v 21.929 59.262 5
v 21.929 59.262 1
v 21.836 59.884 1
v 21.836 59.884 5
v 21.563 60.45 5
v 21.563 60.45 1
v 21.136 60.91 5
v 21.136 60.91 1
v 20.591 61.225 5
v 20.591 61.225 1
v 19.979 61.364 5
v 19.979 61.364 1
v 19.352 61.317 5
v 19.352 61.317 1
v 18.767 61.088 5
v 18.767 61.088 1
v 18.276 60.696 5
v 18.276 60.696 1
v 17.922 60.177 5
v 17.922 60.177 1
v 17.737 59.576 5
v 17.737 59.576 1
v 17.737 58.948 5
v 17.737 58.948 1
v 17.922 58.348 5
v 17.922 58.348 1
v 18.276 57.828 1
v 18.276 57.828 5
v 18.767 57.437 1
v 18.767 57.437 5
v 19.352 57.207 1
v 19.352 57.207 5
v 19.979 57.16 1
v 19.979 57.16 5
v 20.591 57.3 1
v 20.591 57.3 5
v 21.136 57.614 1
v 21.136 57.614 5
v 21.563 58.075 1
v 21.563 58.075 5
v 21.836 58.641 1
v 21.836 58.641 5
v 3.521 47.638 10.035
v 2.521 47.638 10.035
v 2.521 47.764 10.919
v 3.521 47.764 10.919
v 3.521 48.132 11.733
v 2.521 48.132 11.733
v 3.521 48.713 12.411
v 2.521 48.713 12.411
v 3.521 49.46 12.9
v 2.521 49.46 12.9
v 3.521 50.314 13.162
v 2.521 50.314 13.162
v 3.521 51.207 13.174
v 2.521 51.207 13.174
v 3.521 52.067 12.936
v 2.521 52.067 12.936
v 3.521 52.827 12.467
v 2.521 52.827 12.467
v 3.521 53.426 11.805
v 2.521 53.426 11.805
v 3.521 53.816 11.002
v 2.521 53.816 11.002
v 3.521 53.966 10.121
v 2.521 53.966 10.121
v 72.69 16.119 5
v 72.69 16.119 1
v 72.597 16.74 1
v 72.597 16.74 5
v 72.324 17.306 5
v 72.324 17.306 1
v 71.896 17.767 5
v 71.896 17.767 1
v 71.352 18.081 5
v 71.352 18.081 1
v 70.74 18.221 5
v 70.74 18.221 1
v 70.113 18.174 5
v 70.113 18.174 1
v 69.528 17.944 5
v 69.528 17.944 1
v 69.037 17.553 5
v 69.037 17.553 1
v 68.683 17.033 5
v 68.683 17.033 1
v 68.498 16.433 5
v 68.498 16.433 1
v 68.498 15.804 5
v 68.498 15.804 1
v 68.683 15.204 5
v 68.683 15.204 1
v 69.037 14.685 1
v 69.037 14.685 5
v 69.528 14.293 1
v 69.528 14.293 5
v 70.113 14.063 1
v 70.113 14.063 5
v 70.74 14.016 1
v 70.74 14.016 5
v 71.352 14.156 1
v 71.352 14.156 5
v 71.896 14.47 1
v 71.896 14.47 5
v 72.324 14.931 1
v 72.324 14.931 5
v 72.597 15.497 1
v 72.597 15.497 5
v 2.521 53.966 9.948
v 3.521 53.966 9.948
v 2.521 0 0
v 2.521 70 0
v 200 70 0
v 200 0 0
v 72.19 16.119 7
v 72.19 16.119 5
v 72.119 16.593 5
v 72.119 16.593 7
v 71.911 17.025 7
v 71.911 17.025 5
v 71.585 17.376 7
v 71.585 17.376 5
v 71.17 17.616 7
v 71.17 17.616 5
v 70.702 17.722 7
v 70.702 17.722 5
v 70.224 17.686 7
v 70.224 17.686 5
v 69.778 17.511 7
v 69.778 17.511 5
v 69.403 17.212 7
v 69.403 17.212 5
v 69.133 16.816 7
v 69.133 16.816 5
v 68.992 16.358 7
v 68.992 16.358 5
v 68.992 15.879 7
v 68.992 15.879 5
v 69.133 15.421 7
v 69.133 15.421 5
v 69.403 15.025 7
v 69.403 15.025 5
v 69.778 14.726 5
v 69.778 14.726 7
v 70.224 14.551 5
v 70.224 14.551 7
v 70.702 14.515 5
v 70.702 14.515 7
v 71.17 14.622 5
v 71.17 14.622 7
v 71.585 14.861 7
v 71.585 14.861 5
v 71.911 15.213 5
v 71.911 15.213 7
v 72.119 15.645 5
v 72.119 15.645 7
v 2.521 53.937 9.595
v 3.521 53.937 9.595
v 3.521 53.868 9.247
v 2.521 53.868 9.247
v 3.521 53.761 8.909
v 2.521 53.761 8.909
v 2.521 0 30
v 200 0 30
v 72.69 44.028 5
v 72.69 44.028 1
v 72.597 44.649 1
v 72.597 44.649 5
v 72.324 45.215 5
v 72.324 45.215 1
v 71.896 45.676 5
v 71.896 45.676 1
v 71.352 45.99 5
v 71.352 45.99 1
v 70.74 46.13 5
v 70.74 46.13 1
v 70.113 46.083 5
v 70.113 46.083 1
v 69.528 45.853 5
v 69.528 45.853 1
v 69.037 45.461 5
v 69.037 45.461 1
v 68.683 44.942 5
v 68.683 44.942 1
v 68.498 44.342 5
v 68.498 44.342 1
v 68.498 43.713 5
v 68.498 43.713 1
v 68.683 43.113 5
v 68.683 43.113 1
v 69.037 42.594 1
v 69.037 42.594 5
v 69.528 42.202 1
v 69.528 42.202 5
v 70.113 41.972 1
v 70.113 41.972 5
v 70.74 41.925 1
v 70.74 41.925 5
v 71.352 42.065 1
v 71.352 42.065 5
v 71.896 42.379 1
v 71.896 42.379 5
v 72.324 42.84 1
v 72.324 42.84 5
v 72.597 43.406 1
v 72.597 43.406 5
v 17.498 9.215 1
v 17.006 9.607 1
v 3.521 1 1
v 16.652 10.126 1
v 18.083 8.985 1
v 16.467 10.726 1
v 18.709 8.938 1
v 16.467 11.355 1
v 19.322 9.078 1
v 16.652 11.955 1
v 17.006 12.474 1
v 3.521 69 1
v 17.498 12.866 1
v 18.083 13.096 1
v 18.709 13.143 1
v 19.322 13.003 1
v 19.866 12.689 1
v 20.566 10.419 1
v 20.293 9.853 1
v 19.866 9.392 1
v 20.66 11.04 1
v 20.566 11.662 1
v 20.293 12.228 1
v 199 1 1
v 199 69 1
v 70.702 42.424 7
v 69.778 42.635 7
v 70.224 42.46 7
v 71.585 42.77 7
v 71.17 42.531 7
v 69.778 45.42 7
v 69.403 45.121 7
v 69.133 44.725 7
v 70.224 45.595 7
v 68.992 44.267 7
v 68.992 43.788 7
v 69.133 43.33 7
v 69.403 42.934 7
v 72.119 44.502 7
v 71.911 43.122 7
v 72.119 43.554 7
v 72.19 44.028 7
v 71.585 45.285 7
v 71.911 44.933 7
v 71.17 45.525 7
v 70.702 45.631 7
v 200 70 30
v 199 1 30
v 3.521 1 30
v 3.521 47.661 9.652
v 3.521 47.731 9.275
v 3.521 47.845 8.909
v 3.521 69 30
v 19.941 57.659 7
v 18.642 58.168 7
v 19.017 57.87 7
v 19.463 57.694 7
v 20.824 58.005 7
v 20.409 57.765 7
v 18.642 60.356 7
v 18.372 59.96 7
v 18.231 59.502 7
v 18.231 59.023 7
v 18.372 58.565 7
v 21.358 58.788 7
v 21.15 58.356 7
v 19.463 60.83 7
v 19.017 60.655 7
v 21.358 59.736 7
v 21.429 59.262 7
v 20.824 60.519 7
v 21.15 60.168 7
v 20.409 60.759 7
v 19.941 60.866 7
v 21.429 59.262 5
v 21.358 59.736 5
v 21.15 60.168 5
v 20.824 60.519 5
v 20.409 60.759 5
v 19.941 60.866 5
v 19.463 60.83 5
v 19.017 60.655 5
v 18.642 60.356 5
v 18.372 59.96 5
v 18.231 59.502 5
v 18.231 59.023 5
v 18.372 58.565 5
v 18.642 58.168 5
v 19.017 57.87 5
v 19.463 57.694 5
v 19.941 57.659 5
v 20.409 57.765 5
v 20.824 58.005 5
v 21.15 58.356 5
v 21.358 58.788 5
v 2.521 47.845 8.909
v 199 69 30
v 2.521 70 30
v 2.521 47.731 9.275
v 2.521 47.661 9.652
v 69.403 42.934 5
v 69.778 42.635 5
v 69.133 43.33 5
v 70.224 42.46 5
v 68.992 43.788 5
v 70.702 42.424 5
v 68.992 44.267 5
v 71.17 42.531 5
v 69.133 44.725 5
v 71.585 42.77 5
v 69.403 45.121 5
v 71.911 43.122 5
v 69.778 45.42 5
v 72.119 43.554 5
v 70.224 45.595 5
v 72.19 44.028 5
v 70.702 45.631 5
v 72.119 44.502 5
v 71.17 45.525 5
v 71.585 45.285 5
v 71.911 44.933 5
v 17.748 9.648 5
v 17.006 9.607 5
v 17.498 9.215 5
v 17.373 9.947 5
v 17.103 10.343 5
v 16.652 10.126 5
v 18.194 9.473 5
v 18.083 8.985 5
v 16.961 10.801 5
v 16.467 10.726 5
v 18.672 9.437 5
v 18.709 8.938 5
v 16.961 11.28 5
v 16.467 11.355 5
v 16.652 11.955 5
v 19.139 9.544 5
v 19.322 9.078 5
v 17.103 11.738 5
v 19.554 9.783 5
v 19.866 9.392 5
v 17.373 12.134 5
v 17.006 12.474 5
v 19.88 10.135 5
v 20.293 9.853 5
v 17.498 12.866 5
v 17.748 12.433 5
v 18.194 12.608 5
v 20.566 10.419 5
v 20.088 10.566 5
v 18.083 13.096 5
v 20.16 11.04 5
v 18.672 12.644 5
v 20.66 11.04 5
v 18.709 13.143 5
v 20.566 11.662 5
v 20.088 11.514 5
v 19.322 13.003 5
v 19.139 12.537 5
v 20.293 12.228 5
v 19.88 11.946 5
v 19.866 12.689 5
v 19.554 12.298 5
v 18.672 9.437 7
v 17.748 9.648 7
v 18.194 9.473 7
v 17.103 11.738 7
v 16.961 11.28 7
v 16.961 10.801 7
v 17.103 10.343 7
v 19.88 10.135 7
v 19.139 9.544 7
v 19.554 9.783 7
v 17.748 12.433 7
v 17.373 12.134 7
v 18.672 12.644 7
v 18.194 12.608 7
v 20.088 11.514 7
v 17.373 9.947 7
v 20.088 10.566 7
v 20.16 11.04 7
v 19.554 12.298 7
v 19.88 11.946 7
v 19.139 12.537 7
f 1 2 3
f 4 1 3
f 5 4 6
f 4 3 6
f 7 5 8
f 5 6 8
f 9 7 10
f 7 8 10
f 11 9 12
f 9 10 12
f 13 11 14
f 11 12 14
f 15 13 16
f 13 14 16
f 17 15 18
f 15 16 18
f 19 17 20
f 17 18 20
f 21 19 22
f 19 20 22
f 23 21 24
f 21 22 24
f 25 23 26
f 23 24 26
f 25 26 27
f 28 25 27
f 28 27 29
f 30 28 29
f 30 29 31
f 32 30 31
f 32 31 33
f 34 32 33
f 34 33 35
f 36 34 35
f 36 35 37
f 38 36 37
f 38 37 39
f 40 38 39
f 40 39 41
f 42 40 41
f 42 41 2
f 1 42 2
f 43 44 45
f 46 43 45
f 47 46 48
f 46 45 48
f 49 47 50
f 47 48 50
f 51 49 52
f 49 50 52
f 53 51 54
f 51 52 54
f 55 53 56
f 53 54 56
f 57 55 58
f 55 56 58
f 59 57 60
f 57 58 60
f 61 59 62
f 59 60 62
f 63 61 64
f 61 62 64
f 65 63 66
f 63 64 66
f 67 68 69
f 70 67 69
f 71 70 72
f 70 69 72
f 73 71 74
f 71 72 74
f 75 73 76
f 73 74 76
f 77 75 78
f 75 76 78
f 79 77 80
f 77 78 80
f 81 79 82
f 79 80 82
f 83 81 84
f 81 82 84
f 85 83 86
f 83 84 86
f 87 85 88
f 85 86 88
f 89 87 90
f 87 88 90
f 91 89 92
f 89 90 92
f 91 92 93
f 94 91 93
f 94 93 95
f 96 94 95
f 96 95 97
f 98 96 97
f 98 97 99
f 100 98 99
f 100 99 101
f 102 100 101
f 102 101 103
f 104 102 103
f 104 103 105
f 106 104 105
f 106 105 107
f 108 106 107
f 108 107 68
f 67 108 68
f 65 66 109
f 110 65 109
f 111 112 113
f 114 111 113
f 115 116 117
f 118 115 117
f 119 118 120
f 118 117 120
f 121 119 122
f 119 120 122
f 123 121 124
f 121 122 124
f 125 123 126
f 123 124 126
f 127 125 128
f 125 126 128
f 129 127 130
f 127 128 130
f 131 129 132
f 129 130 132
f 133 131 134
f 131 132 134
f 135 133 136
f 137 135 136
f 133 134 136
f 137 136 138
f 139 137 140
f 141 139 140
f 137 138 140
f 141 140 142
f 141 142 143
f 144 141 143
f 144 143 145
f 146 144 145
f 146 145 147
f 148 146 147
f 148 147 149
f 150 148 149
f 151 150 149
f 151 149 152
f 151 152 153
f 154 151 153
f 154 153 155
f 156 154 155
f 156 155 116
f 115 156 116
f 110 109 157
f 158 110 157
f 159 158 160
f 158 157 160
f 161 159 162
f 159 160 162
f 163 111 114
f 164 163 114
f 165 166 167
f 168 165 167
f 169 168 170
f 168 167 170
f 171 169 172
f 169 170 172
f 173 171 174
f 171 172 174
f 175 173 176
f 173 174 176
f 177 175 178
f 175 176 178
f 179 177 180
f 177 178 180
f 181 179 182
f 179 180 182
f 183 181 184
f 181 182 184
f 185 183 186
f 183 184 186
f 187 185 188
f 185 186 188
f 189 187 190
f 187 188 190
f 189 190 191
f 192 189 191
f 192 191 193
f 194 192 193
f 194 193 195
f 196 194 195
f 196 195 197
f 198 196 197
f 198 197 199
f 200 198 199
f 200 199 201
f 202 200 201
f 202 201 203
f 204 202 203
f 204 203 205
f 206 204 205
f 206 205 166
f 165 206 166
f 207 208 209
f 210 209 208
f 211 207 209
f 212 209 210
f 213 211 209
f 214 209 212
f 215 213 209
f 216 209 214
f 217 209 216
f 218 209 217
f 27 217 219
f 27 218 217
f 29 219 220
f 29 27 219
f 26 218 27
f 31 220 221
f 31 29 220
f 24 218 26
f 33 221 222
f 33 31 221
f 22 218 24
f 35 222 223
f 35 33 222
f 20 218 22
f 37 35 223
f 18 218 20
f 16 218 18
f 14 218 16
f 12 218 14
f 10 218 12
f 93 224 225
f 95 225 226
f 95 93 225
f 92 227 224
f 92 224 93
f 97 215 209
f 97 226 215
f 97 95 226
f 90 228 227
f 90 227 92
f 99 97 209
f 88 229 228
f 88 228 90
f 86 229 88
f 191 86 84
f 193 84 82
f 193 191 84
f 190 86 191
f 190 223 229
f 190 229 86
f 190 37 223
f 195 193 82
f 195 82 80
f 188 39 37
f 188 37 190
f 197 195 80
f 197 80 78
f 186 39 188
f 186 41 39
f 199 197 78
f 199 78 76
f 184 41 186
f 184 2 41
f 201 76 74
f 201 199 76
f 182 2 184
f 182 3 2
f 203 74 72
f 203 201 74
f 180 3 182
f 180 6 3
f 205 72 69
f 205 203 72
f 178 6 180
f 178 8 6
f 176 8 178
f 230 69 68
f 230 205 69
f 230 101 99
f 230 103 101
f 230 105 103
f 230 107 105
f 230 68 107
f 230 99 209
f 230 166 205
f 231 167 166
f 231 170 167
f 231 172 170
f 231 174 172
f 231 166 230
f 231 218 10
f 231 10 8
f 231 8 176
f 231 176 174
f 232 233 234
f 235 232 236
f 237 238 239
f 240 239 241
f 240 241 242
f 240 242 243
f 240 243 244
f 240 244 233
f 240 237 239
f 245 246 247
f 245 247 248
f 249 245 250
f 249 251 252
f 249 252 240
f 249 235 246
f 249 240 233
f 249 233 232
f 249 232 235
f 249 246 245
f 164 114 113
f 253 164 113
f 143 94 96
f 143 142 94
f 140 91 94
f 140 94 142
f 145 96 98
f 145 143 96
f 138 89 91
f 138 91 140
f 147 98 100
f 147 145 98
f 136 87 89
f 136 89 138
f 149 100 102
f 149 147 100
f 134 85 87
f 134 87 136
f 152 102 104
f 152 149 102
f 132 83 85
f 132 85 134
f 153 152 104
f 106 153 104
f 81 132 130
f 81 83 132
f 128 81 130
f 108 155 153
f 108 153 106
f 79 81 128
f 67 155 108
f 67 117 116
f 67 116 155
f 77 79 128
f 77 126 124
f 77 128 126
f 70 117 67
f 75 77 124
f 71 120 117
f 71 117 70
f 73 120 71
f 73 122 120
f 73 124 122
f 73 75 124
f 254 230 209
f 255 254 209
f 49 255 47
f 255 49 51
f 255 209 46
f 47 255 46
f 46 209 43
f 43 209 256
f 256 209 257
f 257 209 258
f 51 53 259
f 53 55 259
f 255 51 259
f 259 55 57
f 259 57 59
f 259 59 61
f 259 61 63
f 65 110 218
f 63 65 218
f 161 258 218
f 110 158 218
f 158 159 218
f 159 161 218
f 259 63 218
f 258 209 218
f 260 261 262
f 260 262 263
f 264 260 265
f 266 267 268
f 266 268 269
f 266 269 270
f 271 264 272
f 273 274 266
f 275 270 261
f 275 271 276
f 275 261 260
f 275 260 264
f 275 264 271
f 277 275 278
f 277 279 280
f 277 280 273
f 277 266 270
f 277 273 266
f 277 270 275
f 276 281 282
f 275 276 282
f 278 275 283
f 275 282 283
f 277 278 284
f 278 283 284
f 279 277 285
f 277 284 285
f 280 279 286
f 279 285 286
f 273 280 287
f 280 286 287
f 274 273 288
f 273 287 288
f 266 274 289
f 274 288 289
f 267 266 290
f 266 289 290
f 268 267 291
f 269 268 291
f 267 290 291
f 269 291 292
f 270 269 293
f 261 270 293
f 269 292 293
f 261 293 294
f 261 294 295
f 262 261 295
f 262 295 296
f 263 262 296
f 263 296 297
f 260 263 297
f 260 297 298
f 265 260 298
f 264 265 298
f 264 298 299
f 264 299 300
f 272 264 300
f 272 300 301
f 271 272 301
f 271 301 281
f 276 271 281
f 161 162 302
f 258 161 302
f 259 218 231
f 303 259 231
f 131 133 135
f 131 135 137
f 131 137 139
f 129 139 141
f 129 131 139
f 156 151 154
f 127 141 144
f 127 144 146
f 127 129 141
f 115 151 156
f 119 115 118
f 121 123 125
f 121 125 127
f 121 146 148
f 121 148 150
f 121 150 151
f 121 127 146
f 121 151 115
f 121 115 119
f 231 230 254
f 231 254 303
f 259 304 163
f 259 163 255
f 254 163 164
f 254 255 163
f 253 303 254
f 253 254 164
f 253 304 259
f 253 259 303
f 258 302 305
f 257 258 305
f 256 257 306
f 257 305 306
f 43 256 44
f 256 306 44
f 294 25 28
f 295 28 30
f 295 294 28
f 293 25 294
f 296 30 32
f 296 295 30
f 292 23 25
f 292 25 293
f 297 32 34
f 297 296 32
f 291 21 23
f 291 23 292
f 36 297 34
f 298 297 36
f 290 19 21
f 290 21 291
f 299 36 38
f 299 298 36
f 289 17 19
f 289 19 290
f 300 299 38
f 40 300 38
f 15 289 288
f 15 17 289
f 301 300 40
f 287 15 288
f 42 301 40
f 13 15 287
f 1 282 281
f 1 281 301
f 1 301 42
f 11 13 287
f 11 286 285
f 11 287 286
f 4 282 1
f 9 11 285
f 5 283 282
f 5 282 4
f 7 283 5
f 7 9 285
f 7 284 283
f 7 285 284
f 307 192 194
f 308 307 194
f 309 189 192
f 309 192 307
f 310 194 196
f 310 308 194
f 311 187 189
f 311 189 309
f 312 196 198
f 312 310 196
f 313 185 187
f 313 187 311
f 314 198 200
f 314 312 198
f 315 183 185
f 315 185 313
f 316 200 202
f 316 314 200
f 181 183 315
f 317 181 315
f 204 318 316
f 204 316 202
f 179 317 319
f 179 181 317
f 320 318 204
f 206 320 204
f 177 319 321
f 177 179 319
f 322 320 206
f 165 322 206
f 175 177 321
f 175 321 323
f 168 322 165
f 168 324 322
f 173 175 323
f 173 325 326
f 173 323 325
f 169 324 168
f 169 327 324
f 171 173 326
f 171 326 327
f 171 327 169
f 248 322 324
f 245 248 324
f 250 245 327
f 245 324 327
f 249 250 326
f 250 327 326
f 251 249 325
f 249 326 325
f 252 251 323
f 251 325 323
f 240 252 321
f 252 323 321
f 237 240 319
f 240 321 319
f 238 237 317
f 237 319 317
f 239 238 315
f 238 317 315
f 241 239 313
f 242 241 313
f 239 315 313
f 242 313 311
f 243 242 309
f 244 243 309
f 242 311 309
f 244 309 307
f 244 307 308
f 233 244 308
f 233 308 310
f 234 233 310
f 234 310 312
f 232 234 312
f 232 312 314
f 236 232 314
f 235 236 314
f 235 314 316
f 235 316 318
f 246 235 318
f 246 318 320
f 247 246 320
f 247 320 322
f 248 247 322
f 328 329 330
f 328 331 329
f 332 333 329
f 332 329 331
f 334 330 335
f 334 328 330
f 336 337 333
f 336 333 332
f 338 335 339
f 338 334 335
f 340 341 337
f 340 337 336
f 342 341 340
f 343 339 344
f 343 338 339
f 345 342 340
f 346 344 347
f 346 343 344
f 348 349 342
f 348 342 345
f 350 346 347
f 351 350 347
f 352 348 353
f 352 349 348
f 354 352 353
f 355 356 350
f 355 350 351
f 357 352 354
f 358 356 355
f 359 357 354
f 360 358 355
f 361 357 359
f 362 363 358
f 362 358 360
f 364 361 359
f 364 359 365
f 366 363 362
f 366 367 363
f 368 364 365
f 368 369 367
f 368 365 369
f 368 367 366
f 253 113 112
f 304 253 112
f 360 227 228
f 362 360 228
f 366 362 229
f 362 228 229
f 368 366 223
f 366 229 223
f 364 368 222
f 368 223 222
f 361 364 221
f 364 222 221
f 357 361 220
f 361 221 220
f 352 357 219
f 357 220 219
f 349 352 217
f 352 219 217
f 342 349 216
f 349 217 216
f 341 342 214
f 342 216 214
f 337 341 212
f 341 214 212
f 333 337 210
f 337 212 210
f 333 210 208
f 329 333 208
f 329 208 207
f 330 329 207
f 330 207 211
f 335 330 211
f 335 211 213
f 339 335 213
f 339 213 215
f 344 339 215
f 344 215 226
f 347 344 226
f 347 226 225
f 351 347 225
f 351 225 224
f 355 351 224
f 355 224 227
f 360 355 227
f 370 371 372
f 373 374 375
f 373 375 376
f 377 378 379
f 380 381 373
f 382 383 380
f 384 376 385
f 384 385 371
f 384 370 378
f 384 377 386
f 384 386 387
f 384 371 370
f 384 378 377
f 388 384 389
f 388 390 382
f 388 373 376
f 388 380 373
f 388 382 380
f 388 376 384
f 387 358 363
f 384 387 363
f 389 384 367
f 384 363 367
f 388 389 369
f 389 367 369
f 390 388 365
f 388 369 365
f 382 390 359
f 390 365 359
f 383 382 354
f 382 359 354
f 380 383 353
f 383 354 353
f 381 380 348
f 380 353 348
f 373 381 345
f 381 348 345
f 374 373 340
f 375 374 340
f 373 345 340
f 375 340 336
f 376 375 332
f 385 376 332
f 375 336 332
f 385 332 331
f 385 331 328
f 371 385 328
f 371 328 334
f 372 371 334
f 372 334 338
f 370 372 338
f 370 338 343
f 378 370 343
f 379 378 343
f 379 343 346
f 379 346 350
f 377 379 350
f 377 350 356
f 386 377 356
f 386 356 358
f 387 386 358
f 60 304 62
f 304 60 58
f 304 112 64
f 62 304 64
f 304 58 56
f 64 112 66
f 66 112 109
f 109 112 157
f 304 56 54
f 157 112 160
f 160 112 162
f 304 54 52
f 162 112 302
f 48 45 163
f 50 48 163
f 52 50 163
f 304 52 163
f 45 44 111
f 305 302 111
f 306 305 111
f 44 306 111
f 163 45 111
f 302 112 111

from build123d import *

# Parameters (mm, degrees)
F2_W     = 195.4786418714
F2_H     = 68
F2_R     = 2.1080985417
F2_R_2   = 2.1080985448
F2_R_3   = 2.1080987473
F2_R_4   = 2.1080985484
F3_DEPTH = 1
F2_R_5   = 1.6080985484
F2_R_6   = 1.6080987473
F2_R_7   = 1.6080985448
F2_R_8   = 1.6080985417
F4_DEPTH = 5
F5_DEPTH = 7
F2_H_2   = 1
F2_W_2   = 1
F6_DEPTH = 30
F8_DEPTH = 1


with BuildPart() as f3:
    # F2 (on Top) → F3 (new body)
    with BuildSketch(Plane.XY):
        with Locations((101.2606790643, 35)):
            Rectangle(F2_W, F2_H)
        with Locations((18.551614222, 11.0404381331)):
            Circle(F2_R, mode=Mode.SUBTRACT)
        with Locations((70.5820634049, 16.1186437591)):
            Circle(F2_R_2, mode=Mode.SUBTRACT)
        with Locations((70.5820629074, 44.0276153146)):
            Circle(F2_R_3, mode=Mode.SUBTRACT)
        with Locations((19.8211650697, 59.2622312398)):
            Circle(F2_R_4, mode=Mode.SUBTRACT)
    extrude(amount=F3_DEPTH)

    # F2 (on Top) → F4 (join)
    with BuildSketch(Plane.XY):
        with Locations((19.8211650697, 59.2622312398)):
            Circle(F2_R_4)
        with Locations((19.8211650697, 59.2622312398)):
            Circle(F2_R_5, mode=Mode.SUBTRACT)
        with Locations((70.5820629074, 44.0276153146)):
            Circle(F2_R_3)
        with Locations((70.5820629074, 44.0276153146)):
            Circle(F2_R_6, mode=Mode.SUBTRACT)
        with Locations((70.5820634049, 16.1186437591)):
            Circle(F2_R_2)
        with Locations((70.5820634049, 16.1186437591)):
            Circle(F2_R_7, mode=Mode.SUBTRACT)
        with Locations((18.551614222, 11.0404381331)):
            Circle(F2_R)
        with Locations((18.551614222, 11.0404381331)):
            Circle(F2_R_8, mode=Mode.SUBTRACT)
    extrude(amount=F4_DEPTH)

    # F2 (on Top) → F5 (join)
    with BuildSketch(Plane.XY):
        with Locations((19.8211650697, 59.2622312398)):
            Circle(F2_R_5)
        with Locations((70.5820629074, 44.0276153146)):
            Circle(F2_R_6)
        with Locations((70.5820634049, 16.1186437591)):
            Circle(F2_R_7)
        with Locations((18.551614222, 11.0404381331)):
            Circle(F2_R_8)
    extrude(amount=F5_DEPTH)

    # F2 (on Top) → F6 (join)
    with BuildSketch(Plane.XY):
        with Locations((101.2606790643, 69.5)):
            Rectangle(F2_W, F2_H_2)
        with Locations((199.5, 69.5)):
            Rectangle(F2_W_2, F2_H_2)
        Polygon((2.5213581286, 0), (3.5213581286, 0), (3.5213581286, 1), (3.5213581286, 69), (3.5213581286, 70), (2.5213581286, 70), align=None)
        with Locations((101.2606790643, 0.5)):
            Rectangle(F2_W, F2_H_2)
        with Locations((199.5, 0.5)):
            Rectangle(F2_W_2, F2_H_2)
        with Locations((199.5, 35)):
            Rectangle(F2_W_2, F2_H)
    extrude(amount=F6_DEPTH)

    # F7 (on face) → F8 (cut)
    with BuildSketch(Plane(origin=(2.5213581286, 0, 0), x_dir=(0, -1, 0), z_dir=(-1, 0, 0))):
        with BuildLine():
            Line((-53.966367571, 10.121377154), (-53.966367571, 9.9484939128))
            ThreePointArc((-53.966367571, 9.9484939128), (-53.9072548267, 9.4201302724), (-53.760526233, 8.9091183618))
            Line((-53.760526233, 8.9091183618), (-47.8451862662, 8.9091183618))
            ThreePointArc((-47.8451862662, 8.9091183618), (-47.6903499572, 9.4625889476), (-47.638164158, 10.0349355334))
            ThreePointArc((-47.638164158, 10.0349355334), (-50.7596314072, 13.1993324187), (-53.966367571, 10.121377154))
        make_face()
    extrude(amount=-F8_DEPTH, mode=Mode.SUBTRACT)


solid = f3.part
